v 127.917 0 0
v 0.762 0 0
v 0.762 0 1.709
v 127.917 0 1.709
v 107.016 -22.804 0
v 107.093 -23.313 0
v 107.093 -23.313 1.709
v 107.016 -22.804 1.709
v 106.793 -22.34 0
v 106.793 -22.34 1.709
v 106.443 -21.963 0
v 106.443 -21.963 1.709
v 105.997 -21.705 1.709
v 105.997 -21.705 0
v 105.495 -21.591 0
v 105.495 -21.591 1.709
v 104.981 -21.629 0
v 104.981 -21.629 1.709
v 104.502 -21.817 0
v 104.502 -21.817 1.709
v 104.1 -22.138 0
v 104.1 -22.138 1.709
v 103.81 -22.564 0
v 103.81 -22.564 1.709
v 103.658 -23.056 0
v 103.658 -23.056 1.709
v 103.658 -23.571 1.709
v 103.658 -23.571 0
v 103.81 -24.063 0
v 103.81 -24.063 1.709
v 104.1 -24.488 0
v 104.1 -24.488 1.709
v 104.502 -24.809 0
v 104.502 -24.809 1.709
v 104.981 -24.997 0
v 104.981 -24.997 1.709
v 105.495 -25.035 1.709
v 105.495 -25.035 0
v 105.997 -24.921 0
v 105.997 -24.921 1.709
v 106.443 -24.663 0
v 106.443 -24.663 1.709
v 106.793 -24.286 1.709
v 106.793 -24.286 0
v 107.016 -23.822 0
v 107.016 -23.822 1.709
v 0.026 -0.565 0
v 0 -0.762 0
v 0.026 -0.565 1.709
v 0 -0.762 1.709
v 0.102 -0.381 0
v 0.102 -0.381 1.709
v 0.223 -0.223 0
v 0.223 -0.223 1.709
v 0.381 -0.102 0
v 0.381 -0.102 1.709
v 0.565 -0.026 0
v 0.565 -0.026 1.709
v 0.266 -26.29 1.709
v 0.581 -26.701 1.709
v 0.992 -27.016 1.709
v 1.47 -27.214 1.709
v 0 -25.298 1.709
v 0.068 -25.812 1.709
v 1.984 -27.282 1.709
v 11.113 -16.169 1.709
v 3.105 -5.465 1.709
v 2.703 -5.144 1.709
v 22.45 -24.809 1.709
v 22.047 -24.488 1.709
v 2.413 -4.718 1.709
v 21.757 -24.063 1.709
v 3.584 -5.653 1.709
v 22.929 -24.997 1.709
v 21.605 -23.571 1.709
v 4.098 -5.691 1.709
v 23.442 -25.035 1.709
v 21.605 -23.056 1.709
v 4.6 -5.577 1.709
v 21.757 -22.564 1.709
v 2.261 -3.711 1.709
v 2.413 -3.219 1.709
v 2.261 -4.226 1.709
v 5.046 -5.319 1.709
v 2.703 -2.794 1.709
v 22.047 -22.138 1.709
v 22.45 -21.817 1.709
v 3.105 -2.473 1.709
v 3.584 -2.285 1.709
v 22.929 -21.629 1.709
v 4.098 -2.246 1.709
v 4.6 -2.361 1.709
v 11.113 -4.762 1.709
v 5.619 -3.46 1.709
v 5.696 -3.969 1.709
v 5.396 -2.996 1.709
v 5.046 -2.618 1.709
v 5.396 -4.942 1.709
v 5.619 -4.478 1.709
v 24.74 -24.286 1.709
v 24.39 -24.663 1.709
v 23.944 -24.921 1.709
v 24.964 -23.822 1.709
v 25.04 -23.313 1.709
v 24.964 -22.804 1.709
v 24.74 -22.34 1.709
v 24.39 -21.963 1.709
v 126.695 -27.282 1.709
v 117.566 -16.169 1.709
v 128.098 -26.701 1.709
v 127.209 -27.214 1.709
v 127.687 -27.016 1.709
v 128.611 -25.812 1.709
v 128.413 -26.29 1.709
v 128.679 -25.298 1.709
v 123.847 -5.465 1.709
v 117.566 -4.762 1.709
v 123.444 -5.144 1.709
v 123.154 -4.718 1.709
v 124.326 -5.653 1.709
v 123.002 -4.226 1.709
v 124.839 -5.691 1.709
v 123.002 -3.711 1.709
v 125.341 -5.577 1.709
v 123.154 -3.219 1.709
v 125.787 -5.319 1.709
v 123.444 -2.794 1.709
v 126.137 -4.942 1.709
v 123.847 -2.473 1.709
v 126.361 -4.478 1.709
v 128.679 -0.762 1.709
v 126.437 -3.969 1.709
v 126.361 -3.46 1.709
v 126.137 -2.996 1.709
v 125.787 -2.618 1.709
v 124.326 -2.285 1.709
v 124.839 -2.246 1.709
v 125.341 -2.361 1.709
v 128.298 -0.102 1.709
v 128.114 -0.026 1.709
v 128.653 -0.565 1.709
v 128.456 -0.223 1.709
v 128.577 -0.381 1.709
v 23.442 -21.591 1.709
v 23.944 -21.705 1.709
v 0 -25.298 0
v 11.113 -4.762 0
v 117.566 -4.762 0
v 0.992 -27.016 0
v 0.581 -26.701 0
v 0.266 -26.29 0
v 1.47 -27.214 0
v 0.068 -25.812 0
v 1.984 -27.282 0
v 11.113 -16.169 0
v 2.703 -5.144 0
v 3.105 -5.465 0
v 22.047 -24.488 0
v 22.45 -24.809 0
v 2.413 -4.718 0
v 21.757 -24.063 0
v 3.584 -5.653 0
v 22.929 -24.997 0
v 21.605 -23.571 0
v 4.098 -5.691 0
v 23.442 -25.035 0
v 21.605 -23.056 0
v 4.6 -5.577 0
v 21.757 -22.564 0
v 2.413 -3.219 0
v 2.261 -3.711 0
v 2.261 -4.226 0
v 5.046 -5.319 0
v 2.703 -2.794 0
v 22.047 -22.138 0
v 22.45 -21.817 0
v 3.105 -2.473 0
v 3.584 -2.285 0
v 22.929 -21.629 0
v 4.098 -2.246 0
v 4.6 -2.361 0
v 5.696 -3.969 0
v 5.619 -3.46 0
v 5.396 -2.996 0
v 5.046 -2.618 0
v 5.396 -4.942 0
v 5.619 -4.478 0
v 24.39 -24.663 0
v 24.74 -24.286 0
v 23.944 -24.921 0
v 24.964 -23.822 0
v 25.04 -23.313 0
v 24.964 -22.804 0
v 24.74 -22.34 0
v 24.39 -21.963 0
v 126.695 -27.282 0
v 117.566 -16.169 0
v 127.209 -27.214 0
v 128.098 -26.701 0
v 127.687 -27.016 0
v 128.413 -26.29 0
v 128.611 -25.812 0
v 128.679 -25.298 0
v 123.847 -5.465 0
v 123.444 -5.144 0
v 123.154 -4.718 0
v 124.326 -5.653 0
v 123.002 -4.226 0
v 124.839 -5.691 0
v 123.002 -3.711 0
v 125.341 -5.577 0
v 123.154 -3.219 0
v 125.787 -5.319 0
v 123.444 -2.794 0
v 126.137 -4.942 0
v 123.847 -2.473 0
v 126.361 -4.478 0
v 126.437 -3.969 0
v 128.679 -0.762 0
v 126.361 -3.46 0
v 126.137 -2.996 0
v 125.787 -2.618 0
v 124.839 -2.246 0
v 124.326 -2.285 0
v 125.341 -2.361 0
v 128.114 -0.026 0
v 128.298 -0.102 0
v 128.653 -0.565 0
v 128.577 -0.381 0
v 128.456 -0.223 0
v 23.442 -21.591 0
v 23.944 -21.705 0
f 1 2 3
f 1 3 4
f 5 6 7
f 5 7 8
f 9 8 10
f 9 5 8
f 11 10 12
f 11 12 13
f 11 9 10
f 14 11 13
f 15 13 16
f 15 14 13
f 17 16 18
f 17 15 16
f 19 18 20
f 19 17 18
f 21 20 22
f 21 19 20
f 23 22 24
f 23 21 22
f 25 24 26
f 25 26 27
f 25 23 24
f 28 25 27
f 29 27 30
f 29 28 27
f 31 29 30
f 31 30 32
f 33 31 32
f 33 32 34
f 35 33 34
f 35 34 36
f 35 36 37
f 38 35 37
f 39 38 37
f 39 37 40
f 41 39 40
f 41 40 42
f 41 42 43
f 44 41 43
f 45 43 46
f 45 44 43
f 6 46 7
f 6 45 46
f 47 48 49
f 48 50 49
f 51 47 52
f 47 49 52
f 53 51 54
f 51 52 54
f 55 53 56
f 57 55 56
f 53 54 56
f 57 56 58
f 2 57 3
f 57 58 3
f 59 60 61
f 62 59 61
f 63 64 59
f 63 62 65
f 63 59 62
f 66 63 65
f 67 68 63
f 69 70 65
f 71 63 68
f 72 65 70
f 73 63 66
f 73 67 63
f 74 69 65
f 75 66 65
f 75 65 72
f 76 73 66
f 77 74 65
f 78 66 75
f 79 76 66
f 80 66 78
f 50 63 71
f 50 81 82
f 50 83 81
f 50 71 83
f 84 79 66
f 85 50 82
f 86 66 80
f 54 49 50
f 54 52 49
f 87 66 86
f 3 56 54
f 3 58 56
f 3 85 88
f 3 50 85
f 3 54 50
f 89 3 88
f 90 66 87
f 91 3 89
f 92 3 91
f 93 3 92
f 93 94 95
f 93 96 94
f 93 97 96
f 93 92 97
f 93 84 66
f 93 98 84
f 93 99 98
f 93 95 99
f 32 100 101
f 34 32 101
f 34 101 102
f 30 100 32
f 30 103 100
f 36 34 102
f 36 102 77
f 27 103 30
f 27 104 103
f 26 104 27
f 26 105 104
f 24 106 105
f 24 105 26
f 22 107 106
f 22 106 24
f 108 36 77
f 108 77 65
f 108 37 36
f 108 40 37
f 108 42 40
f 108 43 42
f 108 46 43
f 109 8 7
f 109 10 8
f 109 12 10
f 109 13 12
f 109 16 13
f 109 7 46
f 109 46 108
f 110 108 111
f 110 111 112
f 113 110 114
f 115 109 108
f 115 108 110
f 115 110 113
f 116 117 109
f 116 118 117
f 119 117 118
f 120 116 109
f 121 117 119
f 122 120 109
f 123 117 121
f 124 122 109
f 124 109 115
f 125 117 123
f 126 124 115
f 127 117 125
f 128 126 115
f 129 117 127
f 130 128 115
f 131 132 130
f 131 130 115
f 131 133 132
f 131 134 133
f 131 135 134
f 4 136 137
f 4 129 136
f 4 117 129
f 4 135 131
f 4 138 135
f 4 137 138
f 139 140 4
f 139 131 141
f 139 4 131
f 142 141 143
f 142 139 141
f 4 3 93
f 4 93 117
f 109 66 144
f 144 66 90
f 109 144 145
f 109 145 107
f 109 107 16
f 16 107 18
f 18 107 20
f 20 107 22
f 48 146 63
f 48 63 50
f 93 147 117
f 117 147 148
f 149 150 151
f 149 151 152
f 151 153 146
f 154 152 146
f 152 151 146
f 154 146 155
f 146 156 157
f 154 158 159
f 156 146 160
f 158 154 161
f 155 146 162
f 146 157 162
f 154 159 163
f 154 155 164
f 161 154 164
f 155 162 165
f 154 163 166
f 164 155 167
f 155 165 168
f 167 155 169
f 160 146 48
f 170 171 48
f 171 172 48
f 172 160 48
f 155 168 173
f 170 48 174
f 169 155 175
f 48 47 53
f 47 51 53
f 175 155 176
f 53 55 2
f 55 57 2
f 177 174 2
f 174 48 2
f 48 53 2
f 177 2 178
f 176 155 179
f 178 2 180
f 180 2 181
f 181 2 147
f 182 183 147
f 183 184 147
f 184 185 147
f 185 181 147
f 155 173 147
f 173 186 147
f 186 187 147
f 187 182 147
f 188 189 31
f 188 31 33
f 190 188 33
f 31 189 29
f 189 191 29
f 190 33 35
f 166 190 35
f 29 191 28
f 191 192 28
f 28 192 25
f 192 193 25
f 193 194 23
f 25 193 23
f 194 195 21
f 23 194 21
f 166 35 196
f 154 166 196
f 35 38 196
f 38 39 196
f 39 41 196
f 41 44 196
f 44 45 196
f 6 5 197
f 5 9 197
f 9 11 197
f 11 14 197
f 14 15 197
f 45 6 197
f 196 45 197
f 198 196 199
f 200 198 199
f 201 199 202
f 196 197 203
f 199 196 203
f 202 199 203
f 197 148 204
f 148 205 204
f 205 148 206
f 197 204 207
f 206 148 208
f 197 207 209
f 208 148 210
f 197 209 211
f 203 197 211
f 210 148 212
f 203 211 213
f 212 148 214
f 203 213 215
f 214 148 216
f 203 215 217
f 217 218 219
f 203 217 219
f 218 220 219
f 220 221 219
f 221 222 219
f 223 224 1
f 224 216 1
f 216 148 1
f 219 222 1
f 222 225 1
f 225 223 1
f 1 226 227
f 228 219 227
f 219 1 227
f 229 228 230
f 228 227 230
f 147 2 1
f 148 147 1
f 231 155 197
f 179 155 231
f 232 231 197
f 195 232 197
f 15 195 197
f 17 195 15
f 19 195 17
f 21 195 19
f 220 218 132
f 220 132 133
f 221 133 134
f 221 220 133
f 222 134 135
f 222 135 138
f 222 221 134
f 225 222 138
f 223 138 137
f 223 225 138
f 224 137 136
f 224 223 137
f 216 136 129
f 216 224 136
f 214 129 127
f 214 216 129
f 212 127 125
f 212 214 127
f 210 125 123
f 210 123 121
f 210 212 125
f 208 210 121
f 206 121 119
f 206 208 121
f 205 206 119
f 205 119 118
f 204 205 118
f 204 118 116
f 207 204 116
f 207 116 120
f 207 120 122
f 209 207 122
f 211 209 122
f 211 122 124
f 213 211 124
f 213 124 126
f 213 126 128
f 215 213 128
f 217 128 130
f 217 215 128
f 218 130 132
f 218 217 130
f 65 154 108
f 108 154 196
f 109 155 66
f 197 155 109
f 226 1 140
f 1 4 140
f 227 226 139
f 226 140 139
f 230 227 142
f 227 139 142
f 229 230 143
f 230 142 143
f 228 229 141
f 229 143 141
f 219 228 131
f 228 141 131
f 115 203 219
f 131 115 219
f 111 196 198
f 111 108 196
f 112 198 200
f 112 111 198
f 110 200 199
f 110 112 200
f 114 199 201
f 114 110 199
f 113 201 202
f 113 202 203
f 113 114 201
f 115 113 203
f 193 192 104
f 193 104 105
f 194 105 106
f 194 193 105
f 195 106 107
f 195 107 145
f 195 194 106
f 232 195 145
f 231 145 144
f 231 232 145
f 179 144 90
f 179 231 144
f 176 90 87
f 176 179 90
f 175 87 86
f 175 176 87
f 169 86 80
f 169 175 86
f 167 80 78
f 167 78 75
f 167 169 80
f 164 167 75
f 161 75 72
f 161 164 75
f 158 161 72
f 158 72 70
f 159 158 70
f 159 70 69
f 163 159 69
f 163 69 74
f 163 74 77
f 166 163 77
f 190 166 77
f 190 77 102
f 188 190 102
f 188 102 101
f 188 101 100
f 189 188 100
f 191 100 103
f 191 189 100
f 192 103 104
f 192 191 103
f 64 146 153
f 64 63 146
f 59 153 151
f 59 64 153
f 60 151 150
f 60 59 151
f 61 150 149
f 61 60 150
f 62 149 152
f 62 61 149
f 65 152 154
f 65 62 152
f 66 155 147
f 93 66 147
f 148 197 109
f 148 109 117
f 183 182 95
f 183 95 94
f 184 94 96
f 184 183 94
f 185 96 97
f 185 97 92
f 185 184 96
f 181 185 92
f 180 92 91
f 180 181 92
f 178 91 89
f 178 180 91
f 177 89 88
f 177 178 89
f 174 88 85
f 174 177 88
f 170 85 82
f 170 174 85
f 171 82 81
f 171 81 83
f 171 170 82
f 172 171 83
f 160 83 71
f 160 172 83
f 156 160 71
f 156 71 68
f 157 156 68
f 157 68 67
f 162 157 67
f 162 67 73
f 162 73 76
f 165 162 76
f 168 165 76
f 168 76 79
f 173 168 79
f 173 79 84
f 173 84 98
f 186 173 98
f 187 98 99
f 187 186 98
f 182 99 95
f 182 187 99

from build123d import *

# Parameters (mm, degrees)
F0_W     = 128.67894
F0_H     = 27.281861
F0_R     = 1.7272
F0_W_2   = 106.45394
F0_H_2   = 11.406861
F1_DEPTH = 1.70942
F2_R     = 1.98374
F3_R     = 0.762


with BuildPart() as f1:
    # F0 (on Top) → F1 (new body)
    with BuildSketch(Plane.XY):
        with Locations((64.33947, -13.64093)):
            Rectangle(F0_W, F0_H)
        with Locations((23.313111, -23.313111)):
            Circle(F0_R, mode=Mode.SUBTRACT)
        with Locations((105.365829, -23.313111)):
            Circle(F0_R, mode=Mode.SUBTRACT)
        with Locations((3.96875, -3.96875)):
            Circle(F0_R, mode=Mode.SUBTRACT)
        with Locations((64.33947, -10.46593)):
            Rectangle(F0_W_2, F0_H_2, mode=Mode.SUBTRACT)
        with Locations((124.71019, -3.96875)):
            Circle(F0_R, mode=Mode.SUBTRACT)
    extrude(amount=F1_DEPTH)

    # F2
    f2_edges = [f1.edges().sort_by_distance(p)[0] for p in [
        (0, -27.281861, 0.85471),
        (128.67894, -27.281861, 0.85471),
    ]]
    fillet(f2_edges, radius=F2_R)

    # F3
    f3_edges = [f1.edges().sort_by_distance(p)[0] for p in [
        (0, 0, 0.85471),
        (128.67894, 0, 0.85471),
    ]]
    fillet(f3_edges, radius=F3_R)


solid = f1.part
